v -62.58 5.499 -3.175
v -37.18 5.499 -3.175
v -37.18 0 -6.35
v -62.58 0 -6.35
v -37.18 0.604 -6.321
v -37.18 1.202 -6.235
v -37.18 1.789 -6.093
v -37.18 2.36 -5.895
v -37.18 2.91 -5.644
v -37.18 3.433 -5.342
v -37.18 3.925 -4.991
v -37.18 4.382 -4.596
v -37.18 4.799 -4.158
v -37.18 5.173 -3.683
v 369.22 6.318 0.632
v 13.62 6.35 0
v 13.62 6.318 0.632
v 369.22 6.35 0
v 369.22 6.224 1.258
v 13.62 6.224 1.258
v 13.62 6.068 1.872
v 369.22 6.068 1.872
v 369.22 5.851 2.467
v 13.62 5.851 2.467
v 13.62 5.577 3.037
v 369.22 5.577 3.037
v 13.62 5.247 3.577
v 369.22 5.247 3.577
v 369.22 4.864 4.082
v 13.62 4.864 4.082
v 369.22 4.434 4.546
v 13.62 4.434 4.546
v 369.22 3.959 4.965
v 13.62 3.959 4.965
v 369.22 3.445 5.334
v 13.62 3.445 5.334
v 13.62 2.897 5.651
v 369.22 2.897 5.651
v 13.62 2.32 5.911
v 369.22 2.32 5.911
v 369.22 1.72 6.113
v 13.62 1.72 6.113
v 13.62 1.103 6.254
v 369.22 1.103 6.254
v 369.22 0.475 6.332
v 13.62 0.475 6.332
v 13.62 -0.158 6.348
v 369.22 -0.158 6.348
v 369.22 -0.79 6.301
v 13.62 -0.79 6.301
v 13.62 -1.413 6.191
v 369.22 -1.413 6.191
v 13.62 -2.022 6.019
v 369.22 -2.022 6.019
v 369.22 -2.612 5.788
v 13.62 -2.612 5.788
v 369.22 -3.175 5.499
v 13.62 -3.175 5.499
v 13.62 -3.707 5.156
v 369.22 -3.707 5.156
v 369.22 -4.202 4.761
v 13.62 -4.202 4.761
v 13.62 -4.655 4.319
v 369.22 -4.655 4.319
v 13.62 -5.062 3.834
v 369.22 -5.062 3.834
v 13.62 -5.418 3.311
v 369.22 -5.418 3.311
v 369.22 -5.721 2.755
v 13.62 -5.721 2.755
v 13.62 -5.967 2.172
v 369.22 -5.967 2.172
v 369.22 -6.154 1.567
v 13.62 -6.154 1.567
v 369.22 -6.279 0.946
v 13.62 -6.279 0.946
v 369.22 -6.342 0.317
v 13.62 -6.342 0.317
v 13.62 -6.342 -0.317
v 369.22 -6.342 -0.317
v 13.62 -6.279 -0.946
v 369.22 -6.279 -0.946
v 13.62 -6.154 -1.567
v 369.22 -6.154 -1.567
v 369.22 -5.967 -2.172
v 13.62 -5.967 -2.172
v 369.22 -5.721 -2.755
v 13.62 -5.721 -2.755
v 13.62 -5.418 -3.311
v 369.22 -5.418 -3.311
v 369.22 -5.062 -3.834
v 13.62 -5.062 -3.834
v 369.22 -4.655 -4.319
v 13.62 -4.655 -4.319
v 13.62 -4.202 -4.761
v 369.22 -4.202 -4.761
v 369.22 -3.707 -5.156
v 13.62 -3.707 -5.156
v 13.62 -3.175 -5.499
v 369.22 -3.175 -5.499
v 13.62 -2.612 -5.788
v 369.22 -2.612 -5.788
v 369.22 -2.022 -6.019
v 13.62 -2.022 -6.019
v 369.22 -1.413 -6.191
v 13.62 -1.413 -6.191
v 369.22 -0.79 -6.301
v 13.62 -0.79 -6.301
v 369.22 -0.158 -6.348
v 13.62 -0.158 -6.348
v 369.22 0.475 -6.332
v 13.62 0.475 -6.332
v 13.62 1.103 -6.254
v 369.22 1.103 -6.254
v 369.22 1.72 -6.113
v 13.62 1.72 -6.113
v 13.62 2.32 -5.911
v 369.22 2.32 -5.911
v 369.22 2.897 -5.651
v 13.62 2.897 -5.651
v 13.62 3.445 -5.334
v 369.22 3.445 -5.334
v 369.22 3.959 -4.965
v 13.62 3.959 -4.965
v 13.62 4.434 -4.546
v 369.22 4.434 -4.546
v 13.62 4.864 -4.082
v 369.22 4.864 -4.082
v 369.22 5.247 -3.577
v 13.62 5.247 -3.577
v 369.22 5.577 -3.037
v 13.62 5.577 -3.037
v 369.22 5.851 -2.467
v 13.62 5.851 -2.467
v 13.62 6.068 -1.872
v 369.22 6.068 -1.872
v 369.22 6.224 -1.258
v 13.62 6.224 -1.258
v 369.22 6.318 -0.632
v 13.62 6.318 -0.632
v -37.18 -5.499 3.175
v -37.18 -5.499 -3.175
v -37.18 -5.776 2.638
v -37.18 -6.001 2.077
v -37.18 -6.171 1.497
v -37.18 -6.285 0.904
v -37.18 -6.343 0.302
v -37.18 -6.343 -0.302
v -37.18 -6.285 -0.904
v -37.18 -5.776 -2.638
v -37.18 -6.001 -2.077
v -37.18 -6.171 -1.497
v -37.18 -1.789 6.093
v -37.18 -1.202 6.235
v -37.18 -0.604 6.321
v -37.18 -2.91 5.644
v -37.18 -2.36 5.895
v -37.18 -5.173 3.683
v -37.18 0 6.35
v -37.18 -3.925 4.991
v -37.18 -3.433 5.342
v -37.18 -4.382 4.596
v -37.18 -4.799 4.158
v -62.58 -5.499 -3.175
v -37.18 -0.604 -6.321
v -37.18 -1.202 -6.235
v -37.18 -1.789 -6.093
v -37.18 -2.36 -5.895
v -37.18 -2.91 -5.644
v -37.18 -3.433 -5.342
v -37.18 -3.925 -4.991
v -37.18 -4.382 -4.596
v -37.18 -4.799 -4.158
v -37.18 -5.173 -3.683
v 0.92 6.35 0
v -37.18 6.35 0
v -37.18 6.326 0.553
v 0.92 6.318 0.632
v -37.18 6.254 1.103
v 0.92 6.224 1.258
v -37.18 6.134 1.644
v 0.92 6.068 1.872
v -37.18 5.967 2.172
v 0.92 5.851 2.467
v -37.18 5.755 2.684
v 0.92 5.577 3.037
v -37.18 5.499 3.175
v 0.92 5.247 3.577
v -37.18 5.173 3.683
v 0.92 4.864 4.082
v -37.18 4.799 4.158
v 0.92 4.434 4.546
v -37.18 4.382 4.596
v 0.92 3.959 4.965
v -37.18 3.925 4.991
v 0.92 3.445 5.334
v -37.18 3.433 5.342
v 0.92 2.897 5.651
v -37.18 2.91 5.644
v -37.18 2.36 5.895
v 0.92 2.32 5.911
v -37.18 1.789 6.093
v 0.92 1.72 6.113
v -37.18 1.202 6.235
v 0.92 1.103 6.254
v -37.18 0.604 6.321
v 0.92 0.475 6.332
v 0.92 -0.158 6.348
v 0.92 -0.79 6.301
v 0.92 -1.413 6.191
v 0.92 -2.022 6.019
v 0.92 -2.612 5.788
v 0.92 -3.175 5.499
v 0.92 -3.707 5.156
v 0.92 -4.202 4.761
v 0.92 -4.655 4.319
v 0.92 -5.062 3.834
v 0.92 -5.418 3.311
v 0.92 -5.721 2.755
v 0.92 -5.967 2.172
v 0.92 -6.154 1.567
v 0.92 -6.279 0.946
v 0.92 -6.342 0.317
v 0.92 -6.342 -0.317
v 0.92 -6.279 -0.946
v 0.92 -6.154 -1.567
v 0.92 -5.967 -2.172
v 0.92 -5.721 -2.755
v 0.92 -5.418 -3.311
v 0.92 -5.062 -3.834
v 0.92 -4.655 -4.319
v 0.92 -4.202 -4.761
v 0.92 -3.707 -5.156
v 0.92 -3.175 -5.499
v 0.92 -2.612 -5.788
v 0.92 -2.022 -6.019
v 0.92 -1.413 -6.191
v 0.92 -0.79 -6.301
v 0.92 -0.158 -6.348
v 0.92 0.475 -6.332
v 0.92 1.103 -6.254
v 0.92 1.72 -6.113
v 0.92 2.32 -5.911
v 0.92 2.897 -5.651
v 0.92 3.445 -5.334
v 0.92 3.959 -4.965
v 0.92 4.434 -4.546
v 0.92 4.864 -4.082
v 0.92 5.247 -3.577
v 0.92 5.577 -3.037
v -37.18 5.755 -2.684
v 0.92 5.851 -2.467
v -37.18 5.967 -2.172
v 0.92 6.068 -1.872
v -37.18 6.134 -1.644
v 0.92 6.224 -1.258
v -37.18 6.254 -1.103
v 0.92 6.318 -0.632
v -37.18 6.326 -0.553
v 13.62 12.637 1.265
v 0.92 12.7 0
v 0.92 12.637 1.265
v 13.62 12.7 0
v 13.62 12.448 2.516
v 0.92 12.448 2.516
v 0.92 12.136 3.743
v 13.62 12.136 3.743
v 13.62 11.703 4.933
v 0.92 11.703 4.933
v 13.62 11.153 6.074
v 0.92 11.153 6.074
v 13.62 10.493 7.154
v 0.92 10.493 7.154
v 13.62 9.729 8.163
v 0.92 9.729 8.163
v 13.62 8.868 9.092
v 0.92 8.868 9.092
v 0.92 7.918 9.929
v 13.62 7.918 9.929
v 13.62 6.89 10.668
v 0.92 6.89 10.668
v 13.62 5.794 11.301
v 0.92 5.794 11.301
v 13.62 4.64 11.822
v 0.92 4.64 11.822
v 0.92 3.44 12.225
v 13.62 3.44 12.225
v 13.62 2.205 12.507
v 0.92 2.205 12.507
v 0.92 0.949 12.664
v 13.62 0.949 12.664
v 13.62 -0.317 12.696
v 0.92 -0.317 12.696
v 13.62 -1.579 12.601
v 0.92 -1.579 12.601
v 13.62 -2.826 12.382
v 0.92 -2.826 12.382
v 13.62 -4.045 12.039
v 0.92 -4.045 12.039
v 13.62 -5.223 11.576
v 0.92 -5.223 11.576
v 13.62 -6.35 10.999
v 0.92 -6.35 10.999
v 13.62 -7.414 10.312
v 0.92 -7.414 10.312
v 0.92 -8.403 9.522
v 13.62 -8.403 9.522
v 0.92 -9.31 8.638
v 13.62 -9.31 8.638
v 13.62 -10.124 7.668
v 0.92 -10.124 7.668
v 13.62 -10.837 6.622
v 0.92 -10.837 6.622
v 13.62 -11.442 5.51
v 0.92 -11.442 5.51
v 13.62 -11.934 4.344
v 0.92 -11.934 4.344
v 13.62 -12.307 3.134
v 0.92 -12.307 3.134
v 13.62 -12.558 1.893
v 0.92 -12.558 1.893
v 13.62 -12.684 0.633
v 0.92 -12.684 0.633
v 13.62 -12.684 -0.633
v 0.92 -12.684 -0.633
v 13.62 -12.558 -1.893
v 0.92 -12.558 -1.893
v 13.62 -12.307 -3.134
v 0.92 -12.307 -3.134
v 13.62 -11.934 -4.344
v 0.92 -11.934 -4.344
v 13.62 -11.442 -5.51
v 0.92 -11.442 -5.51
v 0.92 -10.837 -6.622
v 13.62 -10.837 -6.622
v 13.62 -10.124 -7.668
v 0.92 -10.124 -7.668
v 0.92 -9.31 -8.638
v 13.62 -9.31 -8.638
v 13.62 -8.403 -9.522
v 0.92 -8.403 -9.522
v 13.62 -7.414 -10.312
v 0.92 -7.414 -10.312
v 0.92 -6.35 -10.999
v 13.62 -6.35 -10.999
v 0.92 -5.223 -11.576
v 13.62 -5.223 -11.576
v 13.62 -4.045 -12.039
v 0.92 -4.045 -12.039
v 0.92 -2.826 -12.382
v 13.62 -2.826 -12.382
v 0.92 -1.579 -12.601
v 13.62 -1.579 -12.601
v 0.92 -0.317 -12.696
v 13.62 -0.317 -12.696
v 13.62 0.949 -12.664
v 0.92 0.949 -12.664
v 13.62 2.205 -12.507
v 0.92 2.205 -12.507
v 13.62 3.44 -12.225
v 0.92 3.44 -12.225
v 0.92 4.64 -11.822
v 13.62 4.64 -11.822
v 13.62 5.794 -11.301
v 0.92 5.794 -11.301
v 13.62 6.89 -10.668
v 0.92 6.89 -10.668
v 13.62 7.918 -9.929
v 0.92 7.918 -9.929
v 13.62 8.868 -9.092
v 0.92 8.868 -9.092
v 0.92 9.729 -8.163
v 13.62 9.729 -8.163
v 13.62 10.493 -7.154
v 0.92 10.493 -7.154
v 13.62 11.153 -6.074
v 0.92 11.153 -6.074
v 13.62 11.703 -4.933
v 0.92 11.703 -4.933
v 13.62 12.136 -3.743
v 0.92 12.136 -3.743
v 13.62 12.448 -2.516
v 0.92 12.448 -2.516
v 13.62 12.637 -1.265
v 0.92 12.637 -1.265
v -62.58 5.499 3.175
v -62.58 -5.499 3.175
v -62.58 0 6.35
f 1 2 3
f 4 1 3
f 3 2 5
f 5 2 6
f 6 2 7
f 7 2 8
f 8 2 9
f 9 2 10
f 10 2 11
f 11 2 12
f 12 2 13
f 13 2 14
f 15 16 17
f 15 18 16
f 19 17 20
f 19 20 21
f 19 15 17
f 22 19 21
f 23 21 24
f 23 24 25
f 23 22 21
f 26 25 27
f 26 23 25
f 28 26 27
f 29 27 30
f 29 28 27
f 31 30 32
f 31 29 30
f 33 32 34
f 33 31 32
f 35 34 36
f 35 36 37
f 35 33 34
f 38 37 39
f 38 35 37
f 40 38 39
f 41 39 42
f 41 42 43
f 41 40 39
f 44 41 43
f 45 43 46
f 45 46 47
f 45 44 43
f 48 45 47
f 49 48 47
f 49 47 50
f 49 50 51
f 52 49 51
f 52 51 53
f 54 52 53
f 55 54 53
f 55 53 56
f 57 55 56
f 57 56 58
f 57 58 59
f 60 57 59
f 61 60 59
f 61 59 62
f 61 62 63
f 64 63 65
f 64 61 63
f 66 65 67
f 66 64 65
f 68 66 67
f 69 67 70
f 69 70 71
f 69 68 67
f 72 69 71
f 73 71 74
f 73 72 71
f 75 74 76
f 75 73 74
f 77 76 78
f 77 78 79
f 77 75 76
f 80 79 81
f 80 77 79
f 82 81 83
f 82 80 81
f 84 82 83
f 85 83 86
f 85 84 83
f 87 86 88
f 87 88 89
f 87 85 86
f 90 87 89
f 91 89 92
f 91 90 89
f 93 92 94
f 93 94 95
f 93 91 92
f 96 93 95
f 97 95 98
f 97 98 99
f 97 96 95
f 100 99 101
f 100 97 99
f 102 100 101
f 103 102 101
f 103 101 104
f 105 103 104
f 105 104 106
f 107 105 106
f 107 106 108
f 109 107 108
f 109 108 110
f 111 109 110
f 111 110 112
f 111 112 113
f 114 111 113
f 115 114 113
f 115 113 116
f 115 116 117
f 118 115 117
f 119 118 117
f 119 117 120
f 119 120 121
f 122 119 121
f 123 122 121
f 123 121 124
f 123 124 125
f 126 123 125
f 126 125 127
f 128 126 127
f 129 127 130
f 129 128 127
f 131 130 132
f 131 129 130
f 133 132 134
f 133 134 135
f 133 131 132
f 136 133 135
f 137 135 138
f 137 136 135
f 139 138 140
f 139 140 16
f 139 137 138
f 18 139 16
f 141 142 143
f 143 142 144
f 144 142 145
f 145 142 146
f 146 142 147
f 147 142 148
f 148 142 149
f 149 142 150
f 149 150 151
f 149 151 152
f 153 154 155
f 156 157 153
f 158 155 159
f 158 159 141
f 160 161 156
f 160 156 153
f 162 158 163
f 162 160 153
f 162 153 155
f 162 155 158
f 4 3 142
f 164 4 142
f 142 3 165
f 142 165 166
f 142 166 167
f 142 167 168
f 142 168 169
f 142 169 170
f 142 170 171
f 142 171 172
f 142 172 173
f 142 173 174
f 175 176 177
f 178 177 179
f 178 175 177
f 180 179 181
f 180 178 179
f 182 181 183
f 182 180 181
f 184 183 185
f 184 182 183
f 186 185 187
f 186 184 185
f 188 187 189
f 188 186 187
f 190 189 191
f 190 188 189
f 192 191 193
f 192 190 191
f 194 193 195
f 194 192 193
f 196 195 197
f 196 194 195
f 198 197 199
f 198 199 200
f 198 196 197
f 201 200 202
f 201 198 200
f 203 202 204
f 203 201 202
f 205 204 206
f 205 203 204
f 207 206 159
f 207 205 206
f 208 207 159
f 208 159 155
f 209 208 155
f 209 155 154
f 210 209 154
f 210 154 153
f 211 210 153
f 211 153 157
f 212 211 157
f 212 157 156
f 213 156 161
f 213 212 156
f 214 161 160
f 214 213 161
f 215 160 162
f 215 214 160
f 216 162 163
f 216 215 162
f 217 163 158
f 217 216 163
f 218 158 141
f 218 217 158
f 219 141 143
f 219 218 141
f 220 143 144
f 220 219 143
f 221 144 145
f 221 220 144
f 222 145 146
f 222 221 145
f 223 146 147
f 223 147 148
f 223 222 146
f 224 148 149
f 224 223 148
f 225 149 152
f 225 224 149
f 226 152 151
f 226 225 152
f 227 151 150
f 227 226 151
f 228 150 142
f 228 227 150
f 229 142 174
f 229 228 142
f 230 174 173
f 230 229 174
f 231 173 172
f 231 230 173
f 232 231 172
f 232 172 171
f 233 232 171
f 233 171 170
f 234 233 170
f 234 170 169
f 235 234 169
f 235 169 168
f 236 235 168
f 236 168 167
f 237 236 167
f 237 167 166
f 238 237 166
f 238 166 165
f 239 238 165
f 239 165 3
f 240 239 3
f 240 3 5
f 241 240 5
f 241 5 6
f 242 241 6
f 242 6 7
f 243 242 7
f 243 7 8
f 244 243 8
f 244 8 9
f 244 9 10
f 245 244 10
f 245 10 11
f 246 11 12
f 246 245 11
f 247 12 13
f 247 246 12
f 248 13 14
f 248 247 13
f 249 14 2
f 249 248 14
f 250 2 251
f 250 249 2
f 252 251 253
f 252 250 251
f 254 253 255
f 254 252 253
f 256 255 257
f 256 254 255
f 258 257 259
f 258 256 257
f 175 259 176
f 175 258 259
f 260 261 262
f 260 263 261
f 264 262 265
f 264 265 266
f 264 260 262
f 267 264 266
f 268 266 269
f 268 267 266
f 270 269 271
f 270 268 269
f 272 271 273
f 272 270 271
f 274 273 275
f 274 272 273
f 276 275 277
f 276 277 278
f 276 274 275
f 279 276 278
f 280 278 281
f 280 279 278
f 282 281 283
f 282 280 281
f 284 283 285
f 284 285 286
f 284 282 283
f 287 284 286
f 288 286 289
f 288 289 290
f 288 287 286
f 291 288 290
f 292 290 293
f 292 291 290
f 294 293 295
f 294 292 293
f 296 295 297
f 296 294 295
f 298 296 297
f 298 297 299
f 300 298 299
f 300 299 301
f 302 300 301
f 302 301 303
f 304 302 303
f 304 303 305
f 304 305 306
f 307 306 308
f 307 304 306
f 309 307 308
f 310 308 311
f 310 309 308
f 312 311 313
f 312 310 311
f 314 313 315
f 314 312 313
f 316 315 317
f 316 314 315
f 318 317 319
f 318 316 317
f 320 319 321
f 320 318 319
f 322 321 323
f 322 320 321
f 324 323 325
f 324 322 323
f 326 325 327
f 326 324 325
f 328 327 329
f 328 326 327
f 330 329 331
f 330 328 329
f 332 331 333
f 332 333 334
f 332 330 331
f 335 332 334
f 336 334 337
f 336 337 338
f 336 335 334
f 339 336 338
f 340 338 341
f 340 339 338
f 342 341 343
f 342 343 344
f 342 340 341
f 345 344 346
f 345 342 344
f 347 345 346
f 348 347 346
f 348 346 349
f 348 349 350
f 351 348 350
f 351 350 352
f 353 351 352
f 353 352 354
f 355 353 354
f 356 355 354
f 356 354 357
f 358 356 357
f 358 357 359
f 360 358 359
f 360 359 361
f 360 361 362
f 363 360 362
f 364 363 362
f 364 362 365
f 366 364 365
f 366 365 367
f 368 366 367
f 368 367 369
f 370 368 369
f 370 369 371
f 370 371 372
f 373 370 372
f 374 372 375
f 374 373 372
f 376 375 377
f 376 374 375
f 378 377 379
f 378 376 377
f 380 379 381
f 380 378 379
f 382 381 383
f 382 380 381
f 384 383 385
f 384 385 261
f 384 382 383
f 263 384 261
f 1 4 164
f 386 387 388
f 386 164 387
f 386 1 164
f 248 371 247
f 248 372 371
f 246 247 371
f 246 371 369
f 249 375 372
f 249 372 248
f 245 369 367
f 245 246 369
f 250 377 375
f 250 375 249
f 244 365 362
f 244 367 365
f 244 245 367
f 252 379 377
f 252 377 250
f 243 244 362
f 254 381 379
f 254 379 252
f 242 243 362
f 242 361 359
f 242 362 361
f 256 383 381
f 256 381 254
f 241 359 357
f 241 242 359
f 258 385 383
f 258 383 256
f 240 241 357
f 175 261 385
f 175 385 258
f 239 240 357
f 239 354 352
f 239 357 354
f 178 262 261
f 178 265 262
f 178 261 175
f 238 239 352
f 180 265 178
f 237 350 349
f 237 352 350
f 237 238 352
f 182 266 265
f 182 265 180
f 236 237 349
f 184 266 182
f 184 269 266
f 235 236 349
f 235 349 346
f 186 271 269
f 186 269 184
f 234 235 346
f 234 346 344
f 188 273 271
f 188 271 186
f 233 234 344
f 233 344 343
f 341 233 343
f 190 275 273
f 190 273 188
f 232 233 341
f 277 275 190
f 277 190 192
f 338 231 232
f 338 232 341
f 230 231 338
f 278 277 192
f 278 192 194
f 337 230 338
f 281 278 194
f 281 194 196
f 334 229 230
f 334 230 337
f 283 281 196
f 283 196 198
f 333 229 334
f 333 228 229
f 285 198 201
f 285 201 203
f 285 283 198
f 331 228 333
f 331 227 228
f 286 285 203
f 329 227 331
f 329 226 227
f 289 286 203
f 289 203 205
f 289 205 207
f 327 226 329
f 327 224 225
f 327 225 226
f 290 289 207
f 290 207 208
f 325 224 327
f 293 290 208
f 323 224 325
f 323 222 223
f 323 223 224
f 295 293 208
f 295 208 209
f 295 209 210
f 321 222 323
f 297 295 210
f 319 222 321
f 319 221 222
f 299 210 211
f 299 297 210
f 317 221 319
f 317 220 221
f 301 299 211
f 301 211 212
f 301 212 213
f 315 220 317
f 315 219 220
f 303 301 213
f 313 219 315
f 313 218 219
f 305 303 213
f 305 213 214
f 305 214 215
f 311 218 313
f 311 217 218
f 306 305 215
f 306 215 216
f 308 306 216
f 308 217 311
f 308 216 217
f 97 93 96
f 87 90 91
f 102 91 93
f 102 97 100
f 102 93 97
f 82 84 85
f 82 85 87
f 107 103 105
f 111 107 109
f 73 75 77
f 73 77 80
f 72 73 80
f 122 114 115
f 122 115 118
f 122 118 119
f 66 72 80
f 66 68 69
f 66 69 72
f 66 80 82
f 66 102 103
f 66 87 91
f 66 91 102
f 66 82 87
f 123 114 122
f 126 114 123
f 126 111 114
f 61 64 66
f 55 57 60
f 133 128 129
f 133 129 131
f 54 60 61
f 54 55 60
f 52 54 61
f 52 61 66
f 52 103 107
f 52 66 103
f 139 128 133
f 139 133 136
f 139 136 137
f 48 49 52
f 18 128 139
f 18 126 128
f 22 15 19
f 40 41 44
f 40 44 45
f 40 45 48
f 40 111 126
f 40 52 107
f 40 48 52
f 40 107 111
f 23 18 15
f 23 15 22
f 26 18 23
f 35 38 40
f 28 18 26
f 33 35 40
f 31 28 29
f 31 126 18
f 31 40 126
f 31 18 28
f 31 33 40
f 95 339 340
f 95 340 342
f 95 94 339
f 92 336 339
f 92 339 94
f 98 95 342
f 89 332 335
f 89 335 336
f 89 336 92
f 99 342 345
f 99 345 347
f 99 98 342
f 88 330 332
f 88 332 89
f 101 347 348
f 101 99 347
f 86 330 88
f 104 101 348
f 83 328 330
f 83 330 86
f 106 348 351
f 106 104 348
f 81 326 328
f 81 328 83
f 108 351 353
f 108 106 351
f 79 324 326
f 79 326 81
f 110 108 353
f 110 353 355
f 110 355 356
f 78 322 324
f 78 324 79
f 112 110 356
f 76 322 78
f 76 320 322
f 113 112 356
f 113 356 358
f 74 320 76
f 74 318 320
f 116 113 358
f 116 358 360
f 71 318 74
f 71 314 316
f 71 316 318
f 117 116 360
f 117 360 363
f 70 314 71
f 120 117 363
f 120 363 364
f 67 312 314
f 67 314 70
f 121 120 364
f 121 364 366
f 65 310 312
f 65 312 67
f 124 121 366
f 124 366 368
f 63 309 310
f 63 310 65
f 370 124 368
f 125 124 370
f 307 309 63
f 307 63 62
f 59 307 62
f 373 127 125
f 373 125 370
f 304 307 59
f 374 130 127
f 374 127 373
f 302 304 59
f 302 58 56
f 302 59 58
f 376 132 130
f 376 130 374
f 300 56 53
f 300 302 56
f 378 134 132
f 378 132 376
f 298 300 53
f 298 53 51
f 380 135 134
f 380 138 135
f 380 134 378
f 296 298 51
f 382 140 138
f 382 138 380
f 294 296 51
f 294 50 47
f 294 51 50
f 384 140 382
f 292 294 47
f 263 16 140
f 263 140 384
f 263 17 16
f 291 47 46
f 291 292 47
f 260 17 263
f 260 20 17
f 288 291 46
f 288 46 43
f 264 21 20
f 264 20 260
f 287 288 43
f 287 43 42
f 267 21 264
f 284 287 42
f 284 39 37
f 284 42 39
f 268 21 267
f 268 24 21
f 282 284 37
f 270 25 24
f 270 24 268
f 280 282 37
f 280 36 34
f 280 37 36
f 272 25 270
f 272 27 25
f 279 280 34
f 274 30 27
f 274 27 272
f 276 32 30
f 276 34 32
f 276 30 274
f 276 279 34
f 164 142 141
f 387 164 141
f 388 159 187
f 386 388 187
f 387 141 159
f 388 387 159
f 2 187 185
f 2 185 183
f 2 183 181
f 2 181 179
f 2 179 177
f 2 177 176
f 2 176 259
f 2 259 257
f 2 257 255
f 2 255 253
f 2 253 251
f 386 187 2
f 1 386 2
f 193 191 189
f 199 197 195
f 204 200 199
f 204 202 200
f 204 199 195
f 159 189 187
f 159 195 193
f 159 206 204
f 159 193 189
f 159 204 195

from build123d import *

# Parameters (mm, degrees)
BOSS_EXTRUDE1_DEPTH = 25.4


with BuildPart() as part:
    # Sketch1 → Revolve1 (revolve)
    with BuildSketch(Plane.XY):
        Polygon((369.219639575, 6.35), (369.219639575, 0), (-37.180360425, 0), (-37.180360425, 6.35), (0.919639575, 6.35), (0.919639575, 12.7), (13.619639575, 12.7), (13.619639575, 6.35), align=None)
    revolve(axis=Axis((-42.05584448, 0, 0), (1, 0, 0)))

    # Sketch2 → Boss-Extrude1 (add)
    with BuildSketch(Plane.ZY.offset(37.180360425)):
        Polygon((3.175, -5.499261314), (6.35, 0), (3.175, 5.499261314), (-3.175, 5.499261314), (-6.35, 0), (-3.175, -5.499261314), align=None)
    extrude(amount=BOSS_EXTRUDE1_DEPTH)


solid = part.part
